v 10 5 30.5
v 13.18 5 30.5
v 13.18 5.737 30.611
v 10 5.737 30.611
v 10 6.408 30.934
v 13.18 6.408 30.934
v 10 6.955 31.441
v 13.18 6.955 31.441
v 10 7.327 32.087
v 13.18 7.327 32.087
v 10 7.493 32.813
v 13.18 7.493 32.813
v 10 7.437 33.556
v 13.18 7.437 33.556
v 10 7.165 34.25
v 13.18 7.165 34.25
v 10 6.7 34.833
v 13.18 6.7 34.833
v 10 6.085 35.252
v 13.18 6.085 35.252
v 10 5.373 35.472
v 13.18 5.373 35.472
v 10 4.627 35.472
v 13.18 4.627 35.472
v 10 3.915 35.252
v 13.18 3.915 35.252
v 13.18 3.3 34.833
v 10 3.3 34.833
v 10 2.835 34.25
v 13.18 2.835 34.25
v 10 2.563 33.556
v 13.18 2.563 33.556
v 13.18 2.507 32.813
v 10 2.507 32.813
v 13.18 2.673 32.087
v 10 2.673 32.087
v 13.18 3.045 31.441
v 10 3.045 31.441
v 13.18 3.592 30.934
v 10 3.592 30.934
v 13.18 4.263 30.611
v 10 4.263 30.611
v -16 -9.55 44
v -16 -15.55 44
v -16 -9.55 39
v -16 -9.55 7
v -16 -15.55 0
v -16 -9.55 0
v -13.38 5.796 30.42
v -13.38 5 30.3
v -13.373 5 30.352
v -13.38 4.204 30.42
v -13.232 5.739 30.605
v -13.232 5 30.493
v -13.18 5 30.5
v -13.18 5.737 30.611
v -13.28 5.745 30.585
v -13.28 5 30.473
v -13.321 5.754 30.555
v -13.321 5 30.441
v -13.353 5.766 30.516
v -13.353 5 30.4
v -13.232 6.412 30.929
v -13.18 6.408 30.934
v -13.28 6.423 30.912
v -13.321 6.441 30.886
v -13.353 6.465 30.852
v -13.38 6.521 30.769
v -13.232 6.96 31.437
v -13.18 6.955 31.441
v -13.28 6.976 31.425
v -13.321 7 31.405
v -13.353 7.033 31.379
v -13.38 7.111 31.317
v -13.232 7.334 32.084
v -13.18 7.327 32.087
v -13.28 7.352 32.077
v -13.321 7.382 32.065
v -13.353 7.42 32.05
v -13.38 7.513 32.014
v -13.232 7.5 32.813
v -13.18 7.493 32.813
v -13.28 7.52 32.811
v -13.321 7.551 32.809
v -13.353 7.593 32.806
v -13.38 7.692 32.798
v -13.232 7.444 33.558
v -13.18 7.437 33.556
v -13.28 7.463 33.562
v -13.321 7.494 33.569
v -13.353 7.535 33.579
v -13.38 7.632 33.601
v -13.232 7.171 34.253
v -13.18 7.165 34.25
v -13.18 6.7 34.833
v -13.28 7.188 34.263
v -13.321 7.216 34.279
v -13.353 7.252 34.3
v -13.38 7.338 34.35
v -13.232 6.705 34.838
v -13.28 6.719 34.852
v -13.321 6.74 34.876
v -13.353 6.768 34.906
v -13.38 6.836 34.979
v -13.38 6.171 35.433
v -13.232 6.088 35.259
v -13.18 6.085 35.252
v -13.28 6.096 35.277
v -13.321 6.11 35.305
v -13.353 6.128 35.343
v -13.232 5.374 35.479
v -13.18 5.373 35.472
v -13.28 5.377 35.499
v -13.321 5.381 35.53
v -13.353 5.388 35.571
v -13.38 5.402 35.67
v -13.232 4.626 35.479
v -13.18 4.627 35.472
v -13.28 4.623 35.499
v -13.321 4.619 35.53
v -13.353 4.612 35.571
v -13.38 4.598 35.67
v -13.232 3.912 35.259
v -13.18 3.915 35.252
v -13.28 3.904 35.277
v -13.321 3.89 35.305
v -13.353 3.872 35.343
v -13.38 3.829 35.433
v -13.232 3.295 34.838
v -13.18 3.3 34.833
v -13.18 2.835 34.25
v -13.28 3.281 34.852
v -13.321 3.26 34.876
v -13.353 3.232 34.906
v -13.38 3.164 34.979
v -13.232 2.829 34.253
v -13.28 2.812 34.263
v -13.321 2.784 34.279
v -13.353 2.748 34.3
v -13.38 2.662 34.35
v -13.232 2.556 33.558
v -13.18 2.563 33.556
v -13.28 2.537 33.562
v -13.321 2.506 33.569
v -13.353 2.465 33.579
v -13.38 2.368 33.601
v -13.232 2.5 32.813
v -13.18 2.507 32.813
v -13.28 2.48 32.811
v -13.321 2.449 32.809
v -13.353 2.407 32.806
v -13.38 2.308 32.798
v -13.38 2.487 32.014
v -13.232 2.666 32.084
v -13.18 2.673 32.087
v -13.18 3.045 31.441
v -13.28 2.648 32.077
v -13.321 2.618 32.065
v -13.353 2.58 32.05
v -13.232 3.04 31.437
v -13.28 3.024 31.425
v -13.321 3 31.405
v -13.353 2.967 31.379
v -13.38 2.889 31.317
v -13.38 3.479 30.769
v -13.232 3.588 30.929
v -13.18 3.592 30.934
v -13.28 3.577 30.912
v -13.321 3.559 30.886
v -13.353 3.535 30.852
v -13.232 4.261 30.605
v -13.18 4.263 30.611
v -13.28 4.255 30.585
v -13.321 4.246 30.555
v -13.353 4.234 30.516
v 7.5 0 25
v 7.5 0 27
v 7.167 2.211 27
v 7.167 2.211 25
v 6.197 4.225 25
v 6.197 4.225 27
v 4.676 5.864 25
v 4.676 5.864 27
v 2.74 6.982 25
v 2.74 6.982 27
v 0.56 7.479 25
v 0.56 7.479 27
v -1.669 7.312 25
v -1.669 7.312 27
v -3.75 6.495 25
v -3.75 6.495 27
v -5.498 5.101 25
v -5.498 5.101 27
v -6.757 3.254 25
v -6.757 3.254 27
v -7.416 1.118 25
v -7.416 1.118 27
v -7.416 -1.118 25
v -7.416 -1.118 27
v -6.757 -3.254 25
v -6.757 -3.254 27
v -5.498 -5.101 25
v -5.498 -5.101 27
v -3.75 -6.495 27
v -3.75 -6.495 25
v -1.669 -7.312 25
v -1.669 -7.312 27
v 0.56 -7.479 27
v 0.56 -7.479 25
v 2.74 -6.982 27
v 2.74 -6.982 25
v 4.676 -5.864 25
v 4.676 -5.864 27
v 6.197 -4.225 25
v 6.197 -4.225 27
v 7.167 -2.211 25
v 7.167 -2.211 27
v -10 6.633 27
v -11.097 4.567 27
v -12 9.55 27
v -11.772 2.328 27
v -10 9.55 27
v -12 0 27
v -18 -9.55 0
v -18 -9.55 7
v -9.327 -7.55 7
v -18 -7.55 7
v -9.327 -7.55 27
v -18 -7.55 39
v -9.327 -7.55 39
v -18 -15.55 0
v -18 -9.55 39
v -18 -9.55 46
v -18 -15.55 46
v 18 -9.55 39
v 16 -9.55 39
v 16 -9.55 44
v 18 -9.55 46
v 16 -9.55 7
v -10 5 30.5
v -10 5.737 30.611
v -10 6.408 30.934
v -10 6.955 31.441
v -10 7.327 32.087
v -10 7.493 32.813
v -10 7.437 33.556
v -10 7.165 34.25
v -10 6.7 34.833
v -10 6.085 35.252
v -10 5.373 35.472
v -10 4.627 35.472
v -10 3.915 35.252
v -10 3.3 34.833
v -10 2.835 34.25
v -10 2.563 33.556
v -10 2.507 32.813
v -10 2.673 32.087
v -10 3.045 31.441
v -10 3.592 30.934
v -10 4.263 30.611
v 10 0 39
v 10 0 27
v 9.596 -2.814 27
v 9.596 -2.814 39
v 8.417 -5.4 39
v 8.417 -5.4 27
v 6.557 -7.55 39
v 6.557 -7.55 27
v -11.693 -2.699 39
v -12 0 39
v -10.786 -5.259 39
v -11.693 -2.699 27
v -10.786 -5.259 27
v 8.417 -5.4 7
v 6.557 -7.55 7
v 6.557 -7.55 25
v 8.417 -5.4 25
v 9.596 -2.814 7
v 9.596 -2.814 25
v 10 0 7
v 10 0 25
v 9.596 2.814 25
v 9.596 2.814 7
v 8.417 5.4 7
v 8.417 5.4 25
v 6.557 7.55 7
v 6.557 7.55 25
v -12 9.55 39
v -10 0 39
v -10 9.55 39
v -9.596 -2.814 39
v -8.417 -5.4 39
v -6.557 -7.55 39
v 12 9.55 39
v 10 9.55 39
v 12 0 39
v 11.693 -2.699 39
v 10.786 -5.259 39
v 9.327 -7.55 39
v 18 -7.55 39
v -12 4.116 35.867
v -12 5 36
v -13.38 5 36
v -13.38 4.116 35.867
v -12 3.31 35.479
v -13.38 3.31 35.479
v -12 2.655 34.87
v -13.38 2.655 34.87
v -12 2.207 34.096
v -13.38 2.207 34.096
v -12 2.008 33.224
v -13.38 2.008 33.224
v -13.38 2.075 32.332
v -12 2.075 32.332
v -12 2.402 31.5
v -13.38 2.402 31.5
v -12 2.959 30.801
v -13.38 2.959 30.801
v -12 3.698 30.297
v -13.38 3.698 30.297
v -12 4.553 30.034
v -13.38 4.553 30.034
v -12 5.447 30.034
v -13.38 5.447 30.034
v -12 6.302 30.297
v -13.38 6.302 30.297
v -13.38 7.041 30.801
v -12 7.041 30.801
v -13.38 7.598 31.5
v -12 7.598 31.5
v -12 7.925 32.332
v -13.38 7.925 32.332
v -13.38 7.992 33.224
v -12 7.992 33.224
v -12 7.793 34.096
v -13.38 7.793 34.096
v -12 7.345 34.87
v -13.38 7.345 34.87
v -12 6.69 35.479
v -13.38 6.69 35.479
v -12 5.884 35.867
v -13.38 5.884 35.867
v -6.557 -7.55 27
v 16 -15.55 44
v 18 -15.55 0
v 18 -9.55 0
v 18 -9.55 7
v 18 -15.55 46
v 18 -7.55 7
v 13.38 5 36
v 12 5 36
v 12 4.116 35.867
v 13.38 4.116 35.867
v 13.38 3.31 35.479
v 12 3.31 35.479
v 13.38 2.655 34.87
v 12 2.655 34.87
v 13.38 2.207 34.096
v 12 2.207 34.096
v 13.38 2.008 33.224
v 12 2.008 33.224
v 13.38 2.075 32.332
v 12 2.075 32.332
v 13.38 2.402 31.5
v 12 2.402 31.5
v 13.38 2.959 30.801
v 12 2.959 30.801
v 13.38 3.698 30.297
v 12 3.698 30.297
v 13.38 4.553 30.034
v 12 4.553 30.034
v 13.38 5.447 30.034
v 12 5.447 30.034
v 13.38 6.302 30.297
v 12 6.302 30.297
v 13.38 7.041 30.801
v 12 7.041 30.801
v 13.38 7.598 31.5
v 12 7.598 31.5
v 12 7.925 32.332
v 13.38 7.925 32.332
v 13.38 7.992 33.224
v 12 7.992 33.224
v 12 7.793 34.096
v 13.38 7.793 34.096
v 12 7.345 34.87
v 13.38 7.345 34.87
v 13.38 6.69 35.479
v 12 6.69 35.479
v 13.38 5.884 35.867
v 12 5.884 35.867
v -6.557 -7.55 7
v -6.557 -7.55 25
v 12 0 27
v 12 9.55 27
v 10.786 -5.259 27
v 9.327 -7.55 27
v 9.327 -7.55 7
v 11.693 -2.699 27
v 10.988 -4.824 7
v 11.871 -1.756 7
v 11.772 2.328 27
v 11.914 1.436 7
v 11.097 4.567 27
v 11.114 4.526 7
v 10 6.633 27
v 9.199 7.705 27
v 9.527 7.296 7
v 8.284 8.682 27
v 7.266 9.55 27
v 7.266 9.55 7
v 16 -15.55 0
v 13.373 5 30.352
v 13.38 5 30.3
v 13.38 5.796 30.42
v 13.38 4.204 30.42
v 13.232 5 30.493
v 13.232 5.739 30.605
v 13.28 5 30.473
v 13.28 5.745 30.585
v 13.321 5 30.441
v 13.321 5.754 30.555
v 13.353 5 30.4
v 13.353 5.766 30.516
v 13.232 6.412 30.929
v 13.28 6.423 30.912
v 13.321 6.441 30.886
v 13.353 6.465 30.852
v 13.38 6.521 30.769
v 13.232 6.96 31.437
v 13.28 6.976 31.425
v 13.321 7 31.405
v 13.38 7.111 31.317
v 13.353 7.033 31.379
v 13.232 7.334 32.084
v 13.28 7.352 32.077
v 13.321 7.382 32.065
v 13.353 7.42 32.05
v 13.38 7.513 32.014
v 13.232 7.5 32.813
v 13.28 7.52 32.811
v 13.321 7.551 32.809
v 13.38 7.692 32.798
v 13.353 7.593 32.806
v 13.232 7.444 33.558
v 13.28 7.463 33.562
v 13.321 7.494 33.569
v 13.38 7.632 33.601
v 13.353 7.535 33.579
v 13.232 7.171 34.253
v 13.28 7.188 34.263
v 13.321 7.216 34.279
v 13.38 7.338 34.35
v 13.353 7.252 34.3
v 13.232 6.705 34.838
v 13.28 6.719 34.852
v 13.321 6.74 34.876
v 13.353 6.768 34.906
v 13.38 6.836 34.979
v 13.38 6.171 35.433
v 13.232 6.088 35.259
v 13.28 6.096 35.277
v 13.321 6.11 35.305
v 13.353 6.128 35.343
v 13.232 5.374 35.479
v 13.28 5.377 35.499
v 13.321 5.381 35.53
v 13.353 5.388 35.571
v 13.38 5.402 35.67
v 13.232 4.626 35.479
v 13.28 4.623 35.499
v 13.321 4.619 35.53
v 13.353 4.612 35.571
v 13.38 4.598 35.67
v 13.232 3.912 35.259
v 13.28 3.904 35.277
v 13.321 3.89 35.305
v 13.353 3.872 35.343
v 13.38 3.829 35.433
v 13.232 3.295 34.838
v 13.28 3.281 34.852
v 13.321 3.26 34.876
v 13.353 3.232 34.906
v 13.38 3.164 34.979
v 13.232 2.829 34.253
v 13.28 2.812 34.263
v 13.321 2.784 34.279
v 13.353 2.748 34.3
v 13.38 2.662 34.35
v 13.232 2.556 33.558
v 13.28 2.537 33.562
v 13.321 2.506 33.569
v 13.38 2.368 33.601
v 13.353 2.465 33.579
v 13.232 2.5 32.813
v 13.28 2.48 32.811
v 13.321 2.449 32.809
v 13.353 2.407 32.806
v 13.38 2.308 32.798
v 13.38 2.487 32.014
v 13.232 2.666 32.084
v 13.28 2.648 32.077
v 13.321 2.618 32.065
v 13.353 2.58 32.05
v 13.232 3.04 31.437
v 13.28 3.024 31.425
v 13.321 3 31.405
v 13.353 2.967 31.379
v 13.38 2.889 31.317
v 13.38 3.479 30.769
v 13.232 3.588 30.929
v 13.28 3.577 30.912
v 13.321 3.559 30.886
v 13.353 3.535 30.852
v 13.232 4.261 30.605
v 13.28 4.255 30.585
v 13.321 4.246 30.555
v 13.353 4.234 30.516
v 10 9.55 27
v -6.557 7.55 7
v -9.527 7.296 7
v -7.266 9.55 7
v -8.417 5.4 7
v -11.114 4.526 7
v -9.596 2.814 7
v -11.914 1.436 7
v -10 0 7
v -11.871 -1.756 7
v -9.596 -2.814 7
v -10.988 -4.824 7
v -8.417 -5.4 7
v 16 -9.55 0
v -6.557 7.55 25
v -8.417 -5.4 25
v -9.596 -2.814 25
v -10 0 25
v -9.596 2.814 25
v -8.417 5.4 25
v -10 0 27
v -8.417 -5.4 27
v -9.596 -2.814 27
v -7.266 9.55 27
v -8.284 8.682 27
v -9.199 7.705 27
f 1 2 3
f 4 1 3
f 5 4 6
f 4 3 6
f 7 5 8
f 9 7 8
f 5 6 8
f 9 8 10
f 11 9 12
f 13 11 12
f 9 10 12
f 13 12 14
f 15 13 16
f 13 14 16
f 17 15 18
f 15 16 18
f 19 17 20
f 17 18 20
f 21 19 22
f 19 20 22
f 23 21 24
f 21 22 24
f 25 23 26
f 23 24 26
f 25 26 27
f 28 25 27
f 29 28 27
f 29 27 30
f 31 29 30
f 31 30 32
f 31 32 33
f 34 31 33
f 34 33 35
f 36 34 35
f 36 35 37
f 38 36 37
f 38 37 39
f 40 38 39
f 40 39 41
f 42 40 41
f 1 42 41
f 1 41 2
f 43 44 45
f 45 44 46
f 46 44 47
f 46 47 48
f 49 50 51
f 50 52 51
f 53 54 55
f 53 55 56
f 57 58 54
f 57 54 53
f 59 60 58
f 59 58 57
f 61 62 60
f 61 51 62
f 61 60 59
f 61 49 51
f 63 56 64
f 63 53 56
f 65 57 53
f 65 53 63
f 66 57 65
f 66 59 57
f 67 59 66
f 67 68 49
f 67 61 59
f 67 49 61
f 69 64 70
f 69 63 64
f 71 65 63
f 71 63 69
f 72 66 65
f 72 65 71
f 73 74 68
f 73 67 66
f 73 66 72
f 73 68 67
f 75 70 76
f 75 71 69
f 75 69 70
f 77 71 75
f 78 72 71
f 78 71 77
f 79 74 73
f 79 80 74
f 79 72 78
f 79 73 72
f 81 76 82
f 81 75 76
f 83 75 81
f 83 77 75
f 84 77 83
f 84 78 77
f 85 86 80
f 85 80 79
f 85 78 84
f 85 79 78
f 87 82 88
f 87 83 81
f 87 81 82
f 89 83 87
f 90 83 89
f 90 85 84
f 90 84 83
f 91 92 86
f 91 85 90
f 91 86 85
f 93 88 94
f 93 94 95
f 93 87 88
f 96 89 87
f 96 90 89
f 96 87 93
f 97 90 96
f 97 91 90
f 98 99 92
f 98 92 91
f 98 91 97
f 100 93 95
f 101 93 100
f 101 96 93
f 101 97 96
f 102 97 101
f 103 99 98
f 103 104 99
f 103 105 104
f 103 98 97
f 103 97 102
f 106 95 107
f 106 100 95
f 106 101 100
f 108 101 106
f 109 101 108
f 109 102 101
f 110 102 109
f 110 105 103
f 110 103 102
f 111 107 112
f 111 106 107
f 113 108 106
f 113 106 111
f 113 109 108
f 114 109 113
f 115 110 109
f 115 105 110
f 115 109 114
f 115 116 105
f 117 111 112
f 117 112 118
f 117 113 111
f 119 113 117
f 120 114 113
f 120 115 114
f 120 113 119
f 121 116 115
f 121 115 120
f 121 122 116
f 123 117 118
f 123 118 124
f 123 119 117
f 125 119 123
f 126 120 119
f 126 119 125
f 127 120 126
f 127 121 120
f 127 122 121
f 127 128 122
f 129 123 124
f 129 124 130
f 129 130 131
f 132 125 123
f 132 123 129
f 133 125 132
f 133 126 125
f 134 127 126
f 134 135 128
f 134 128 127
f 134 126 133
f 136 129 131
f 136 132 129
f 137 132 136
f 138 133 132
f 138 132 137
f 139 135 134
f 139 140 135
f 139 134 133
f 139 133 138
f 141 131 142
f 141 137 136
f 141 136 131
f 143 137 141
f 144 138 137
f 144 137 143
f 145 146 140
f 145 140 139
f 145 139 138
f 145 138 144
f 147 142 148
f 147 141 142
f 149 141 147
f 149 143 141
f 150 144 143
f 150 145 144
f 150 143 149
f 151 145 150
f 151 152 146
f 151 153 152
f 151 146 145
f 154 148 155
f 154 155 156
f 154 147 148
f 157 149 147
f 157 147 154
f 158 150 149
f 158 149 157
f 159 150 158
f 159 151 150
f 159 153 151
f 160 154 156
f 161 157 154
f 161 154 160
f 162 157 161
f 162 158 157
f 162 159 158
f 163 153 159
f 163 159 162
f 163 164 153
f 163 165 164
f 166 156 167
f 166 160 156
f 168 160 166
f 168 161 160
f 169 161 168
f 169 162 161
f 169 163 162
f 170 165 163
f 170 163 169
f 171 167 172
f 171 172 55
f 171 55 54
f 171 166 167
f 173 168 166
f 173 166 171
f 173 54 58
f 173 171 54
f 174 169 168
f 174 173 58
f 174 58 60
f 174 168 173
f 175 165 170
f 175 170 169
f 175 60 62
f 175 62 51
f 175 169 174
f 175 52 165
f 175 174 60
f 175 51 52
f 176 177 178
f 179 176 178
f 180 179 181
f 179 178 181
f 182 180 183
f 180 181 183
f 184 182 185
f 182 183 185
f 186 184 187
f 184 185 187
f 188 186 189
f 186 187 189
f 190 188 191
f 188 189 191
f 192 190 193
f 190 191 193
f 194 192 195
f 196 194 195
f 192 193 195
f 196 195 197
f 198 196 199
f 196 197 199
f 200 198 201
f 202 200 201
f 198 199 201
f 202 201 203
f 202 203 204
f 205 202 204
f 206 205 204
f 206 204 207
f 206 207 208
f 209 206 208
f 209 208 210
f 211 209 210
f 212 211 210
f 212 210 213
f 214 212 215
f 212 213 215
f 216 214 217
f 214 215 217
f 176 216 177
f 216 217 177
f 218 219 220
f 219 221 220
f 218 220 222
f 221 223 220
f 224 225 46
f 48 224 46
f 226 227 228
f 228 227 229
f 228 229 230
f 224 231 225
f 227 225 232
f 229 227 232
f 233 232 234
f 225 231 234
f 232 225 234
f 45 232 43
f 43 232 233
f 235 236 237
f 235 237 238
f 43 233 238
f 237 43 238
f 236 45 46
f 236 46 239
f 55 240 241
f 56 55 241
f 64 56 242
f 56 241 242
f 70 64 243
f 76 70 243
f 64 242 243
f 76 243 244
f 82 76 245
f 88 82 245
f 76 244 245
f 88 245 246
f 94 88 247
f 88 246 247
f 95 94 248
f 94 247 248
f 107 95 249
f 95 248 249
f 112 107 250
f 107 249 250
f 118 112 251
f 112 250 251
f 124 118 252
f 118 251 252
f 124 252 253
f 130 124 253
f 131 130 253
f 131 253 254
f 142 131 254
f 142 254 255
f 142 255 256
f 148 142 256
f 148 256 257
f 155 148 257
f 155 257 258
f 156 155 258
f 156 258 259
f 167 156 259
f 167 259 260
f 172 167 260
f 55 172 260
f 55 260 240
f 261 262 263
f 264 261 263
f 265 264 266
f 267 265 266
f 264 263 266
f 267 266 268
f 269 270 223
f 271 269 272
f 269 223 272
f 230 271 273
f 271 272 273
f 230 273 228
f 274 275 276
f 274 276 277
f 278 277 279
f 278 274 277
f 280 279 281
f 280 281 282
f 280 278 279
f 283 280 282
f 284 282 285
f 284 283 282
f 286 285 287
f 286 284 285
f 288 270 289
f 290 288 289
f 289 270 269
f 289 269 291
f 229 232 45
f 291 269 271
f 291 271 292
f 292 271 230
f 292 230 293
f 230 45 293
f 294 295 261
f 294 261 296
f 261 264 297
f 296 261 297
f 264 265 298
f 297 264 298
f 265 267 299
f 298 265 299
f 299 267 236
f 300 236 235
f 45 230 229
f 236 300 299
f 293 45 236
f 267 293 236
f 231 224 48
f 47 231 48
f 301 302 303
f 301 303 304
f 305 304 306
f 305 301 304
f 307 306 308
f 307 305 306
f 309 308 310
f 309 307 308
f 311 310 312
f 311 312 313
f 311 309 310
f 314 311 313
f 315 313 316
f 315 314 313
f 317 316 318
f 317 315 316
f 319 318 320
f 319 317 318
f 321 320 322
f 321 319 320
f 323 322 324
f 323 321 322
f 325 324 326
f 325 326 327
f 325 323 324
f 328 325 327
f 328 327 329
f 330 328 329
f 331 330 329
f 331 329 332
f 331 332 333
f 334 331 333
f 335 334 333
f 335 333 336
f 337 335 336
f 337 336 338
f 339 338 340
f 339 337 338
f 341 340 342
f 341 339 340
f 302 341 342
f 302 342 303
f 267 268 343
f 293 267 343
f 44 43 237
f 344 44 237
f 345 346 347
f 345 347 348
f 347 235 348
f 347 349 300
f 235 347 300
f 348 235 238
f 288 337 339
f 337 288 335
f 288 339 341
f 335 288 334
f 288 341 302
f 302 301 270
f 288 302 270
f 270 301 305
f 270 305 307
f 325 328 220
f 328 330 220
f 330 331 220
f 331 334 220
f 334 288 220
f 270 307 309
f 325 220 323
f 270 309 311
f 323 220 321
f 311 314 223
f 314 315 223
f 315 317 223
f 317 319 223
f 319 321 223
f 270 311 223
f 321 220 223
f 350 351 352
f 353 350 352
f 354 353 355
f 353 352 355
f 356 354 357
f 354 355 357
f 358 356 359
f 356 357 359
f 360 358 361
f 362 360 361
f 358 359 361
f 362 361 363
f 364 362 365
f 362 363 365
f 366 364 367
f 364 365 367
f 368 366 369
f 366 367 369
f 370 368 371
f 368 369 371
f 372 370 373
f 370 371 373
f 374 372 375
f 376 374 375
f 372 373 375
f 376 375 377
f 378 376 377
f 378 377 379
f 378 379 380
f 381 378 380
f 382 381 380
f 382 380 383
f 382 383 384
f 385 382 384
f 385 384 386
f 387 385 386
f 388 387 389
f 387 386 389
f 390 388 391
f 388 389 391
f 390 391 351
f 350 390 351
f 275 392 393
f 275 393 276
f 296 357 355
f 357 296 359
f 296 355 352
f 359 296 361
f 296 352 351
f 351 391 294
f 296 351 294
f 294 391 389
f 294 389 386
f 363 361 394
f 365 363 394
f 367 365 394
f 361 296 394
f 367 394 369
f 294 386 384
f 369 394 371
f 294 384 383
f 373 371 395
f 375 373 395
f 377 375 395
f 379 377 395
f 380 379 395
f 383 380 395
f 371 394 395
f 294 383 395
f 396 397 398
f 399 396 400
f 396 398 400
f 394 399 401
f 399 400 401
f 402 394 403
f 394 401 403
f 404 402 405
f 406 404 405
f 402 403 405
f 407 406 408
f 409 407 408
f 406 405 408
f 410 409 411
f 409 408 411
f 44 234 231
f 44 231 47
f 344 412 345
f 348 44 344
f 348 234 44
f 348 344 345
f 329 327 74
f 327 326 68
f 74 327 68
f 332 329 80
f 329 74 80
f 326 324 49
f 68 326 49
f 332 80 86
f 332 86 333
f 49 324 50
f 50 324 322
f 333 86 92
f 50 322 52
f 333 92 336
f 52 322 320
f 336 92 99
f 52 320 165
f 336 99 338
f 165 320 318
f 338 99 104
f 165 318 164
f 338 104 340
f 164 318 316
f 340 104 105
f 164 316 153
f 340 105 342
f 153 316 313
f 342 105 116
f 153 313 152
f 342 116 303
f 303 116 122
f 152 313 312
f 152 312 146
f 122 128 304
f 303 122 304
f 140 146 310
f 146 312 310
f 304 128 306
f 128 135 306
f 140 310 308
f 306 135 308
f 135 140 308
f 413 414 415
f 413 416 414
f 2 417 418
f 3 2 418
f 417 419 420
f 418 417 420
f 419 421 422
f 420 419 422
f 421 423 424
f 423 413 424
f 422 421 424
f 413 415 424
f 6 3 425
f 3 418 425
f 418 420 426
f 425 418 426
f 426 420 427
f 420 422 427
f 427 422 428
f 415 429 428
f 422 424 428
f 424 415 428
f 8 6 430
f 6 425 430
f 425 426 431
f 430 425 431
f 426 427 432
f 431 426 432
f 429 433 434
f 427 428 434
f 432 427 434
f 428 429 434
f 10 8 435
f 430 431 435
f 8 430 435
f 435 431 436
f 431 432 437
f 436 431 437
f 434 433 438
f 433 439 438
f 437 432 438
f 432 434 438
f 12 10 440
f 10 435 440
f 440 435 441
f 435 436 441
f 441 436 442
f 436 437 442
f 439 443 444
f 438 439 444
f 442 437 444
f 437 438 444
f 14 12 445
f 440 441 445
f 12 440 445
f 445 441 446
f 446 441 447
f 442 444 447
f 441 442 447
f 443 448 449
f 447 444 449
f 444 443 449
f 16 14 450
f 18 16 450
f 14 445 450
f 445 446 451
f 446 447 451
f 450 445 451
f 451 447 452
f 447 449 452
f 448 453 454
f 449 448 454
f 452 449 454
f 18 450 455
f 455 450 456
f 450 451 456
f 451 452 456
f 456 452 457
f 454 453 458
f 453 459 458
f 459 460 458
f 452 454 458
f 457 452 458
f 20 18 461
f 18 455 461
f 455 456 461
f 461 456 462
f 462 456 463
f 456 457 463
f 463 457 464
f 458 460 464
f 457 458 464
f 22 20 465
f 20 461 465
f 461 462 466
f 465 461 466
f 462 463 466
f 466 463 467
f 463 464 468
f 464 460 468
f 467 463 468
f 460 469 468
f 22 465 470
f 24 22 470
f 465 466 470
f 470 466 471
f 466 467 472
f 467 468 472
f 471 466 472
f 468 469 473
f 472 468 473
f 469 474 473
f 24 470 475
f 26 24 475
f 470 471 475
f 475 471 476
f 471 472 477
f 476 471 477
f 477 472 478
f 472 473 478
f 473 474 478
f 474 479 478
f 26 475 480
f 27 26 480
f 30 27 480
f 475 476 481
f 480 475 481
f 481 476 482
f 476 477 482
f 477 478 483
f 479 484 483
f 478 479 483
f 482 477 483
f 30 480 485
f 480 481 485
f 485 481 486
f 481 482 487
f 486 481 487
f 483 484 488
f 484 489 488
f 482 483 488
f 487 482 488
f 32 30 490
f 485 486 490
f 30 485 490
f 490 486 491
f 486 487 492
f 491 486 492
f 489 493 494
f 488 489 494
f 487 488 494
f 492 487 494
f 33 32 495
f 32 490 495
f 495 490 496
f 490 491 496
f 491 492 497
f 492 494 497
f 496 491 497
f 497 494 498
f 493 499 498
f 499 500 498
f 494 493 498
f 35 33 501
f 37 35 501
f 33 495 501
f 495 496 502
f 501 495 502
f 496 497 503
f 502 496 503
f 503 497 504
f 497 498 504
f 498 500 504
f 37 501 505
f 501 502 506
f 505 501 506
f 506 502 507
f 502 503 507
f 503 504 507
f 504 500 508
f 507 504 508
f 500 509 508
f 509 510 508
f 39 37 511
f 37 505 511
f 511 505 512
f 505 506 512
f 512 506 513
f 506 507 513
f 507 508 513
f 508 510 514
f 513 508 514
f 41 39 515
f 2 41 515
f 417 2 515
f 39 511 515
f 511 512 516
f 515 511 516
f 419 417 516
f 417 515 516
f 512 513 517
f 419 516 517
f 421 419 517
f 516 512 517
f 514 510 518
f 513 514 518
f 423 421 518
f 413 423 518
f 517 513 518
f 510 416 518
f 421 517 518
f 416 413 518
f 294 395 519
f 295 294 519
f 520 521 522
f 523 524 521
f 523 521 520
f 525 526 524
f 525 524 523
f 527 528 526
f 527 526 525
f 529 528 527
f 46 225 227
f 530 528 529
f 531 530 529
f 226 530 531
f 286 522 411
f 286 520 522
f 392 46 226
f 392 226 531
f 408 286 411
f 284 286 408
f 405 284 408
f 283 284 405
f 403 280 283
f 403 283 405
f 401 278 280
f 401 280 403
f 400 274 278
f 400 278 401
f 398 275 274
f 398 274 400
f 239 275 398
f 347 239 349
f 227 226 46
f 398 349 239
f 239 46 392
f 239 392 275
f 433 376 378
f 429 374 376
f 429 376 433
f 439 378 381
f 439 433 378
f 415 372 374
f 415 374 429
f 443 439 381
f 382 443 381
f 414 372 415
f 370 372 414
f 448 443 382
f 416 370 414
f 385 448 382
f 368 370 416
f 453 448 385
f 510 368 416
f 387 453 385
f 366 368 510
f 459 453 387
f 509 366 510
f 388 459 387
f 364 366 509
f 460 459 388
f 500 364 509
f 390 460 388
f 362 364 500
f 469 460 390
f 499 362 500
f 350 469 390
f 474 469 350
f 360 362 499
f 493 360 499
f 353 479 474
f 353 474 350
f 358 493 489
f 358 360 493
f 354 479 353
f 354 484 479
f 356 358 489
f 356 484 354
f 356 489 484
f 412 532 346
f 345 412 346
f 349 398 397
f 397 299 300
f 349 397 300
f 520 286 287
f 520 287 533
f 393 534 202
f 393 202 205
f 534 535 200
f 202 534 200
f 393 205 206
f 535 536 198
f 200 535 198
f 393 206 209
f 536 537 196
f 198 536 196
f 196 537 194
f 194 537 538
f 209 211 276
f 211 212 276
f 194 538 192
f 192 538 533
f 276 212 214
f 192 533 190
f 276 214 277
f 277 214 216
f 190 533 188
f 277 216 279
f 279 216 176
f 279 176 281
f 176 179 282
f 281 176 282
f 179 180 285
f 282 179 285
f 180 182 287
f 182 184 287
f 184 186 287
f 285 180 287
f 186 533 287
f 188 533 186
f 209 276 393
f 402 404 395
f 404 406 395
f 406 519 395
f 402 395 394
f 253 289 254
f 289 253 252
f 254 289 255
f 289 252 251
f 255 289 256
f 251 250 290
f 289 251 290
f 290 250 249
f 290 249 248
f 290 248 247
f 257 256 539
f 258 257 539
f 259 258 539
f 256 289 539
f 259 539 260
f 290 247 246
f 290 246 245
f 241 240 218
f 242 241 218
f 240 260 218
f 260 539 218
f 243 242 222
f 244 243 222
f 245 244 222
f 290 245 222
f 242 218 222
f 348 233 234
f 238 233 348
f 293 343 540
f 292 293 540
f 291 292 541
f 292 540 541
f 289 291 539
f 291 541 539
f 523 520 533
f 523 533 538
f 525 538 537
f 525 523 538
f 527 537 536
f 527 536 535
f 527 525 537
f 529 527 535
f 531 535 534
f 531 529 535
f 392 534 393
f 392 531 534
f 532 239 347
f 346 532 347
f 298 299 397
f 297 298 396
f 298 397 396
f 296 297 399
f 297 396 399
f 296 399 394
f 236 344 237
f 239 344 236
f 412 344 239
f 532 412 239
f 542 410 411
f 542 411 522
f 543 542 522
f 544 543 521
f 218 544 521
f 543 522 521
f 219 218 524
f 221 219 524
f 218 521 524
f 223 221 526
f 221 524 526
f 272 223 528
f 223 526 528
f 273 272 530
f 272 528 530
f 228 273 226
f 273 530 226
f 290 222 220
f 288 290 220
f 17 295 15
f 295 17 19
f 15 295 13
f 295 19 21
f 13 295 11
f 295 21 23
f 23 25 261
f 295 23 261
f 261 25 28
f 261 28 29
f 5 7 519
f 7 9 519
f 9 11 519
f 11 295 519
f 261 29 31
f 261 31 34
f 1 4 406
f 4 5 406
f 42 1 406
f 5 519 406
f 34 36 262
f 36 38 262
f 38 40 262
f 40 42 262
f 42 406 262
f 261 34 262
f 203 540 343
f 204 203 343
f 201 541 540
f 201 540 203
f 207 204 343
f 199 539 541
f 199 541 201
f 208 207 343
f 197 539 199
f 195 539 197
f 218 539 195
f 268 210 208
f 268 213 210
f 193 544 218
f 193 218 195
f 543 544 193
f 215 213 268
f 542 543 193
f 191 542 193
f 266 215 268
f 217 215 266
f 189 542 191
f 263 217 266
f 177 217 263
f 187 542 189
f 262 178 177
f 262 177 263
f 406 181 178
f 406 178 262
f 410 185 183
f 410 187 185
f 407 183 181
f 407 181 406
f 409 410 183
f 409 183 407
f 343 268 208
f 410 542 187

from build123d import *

# Parameters (mm, degrees)
EXTRUDE1_START     = 7
EXTRUDE1_DEPTH     = 20
SKETCH2_R          = 7.5
CUT_EXTRUDE1_DEPTH = 2
SHELL1_START       = 7
SHELL1_DEPTH       = 18
EXTRUDE2_DEPTH     = 12
SKETCH9_R          = 3
EXTRUDE4_DEPTH     = 1.38
SKETCH10_R         = 2.5
CUT_EXTRUDE3_DEPTH = 49.252462113
FILLET1_R          = 0.2
SKETCH11_W         = 36
SKETCH11_H         = 46
SKETCH11_W_2       = 32
SKETCH11_H_2       = 42
EXTRUDE5_DEPTH     = 6
SKETCH12_W         = 32
SKETCH12_H         = 8.201060756
CUT_EXTRUDE4_DEPTH = 2
SKETCH13_W         = 36
SKETCH13_H         = 32
EXTRUDE6_DEPTH     = 2


# Read off the part's stored shape, not the designer's step: Shell1
with BuildPart() as part:
    # Sketch1 → Extrude1 (new body)
    with BuildSketch(Plane.XY.offset(EXTRUDE1_START)):
        with BuildLine():
            Line((-7.266188822, -9.55), (7.266188822, -9.55))
            ThreePointArc((7.266188822, -9.55), (12, 0), (7.266188822, 9.55))
            Line((7.266188822, 9.55), (-7.266188822, 9.55))
            ThreePointArc((-7.266188822, 9.55), (-12, 0), (-7.266188822, -9.55))
        make_face()
    extrude(amount=EXTRUDE1_DEPTH)

    # Sketch2 → Cut-Extrude1 (cut)
    with BuildSketch(Plane.XY.offset(27)):
        Circle(SKETCH2_R)
    extrude(amount=-CUT_EXTRUDE1_DEPTH, mode=Mode.SUBTRACT)

    # Shell1 outline → Shell1 (cut)
    with BuildSketch(Plane.XY.offset(SHELL1_START)):
        with BuildLine():
            Line((6.557247898, 7.55), (-6.557247898, 7.55))
            ThreePointArc((-6.557247898, 7.55), (-10, 0), (-6.557247898, -7.55))
            Line((-6.557247898, -7.55), (6.557247898, -7.55))
            ThreePointArc((6.557247898, -7.55), (10, 0), (6.557247898, 7.55))
        make_face()
    extrude(amount=SHELL1_DEPTH, mode=Mode.SUBTRACT)

    # Sketch5 → Extrude2 (add)
    with BuildSketch(Plane.XY.offset(27)):
        with BuildLine():
            Line((-7.266188822, -9.55), (7.266188822, -9.55))
            ThreePointArc((7.266188822, -9.55), (10.751610713, -5.329434029), (12, 0))
            Line((12, 0), (12, 9.55))
            Line((12, 9.55), (10, 9.55))
            Line((10, 9.55), (10, 0))
            ThreePointArc((10, 0), (9.098694384, -4.148946916), (6.557247898, -7.55))
            Line((6.557247898, -7.55), (-6.557247898, -7.55))
            ThreePointArc((-6.557247898, -7.55), (-9.098694384, -4.148946916), (-10, 0))
            Line((-10, 0), (-10, 9.55))
            Line((-10, 9.55), (-12, 9.55))
            Line((-12, 9.55), (-12, 0))
            ThreePointArc((-12, 0), (-10.751610713, -5.329434029), (-7.266188822, -9.55))
        make_face()
    extrude(amount=EXTRUDE2_DEPTH)

    # Sketch9 → Extrude4 (add)
    with BuildSketch(Plane(origin=(12, 0, 0), x_dir=(0, 0, -1), z_dir=(1, 0, 0))):
        with Locations(Location((-33, 5, 0), (0, 0, 180))):
            Circle(SKETCH9_R)
    extrude4 = extrude(amount=EXTRUDE4_DEPTH)

    # Mirror2: Extrude4 across plane
    add(extrude4.mirror(Plane(origin=(0, 0, 0), x_dir=(0, 0, 1), z_dir=(1, 0, 0))))

    # Sketch10 → Cut-Extrude3 (cut, through all)
    with BuildSketch(Plane(origin=(13.38, 0, 0), x_dir=(0, 0, -1), z_dir=(1, 0, 0))):
        with Locations((-33, 5)):
            Circle(SKETCH10_R)
    extrude(amount=-CUT_EXTRUDE3_DEPTH, mode=Mode.SUBTRACT)

    # Fillet1
    fillet1_edges = [part.edges().sort_by_distance(p)[0] for p in [
        (-13.38, 5, 35.5),
        (13.38, 5, 35.5),
    ]]
    fillet(fillet1_edges, radius=FILLET1_R)



with BuildPart() as body_2:
    # Sketch11 → Extrude5 (new body)
    with BuildSketch(Plane.XZ.offset(9.55)):
        with Locations((0, 23)):
            Rectangle(SKETCH11_W, SKETCH11_H)
        with Locations((0, 23)):
            Rectangle(SKETCH11_W_2, SKETCH11_H_2, mode=Mode.SUBTRACT)
    extrude(amount=EXTRUDE5_DEPTH)

    # Sketch12 → Cut-Extrude4 (cut)
    with BuildSketch(Plane(origin=(0, 0, 0), x_dir=(-1, 0, 0), z_dir=(0, 0, -1))):
        with Locations((0, -12.325842128)):
            Rectangle(SKETCH12_W, SKETCH12_H)
    extrude(amount=-CUT_EXTRUDE4_DEPTH, mode=Mode.SUBTRACT)


with BuildPart() as part_1:
    add(part.part)

    add(body_2.part)  # Extrude6 merges body 2
    # Sketch13 → Extrude6 (add)
    with BuildSketch(Plane.XZ.offset(9.55)):
        with Locations((0, 23)):
            Rectangle(SKETCH13_W, SKETCH13_H)
    extrude(amount=-EXTRUDE6_DEPTH)


solid = part_1.part
